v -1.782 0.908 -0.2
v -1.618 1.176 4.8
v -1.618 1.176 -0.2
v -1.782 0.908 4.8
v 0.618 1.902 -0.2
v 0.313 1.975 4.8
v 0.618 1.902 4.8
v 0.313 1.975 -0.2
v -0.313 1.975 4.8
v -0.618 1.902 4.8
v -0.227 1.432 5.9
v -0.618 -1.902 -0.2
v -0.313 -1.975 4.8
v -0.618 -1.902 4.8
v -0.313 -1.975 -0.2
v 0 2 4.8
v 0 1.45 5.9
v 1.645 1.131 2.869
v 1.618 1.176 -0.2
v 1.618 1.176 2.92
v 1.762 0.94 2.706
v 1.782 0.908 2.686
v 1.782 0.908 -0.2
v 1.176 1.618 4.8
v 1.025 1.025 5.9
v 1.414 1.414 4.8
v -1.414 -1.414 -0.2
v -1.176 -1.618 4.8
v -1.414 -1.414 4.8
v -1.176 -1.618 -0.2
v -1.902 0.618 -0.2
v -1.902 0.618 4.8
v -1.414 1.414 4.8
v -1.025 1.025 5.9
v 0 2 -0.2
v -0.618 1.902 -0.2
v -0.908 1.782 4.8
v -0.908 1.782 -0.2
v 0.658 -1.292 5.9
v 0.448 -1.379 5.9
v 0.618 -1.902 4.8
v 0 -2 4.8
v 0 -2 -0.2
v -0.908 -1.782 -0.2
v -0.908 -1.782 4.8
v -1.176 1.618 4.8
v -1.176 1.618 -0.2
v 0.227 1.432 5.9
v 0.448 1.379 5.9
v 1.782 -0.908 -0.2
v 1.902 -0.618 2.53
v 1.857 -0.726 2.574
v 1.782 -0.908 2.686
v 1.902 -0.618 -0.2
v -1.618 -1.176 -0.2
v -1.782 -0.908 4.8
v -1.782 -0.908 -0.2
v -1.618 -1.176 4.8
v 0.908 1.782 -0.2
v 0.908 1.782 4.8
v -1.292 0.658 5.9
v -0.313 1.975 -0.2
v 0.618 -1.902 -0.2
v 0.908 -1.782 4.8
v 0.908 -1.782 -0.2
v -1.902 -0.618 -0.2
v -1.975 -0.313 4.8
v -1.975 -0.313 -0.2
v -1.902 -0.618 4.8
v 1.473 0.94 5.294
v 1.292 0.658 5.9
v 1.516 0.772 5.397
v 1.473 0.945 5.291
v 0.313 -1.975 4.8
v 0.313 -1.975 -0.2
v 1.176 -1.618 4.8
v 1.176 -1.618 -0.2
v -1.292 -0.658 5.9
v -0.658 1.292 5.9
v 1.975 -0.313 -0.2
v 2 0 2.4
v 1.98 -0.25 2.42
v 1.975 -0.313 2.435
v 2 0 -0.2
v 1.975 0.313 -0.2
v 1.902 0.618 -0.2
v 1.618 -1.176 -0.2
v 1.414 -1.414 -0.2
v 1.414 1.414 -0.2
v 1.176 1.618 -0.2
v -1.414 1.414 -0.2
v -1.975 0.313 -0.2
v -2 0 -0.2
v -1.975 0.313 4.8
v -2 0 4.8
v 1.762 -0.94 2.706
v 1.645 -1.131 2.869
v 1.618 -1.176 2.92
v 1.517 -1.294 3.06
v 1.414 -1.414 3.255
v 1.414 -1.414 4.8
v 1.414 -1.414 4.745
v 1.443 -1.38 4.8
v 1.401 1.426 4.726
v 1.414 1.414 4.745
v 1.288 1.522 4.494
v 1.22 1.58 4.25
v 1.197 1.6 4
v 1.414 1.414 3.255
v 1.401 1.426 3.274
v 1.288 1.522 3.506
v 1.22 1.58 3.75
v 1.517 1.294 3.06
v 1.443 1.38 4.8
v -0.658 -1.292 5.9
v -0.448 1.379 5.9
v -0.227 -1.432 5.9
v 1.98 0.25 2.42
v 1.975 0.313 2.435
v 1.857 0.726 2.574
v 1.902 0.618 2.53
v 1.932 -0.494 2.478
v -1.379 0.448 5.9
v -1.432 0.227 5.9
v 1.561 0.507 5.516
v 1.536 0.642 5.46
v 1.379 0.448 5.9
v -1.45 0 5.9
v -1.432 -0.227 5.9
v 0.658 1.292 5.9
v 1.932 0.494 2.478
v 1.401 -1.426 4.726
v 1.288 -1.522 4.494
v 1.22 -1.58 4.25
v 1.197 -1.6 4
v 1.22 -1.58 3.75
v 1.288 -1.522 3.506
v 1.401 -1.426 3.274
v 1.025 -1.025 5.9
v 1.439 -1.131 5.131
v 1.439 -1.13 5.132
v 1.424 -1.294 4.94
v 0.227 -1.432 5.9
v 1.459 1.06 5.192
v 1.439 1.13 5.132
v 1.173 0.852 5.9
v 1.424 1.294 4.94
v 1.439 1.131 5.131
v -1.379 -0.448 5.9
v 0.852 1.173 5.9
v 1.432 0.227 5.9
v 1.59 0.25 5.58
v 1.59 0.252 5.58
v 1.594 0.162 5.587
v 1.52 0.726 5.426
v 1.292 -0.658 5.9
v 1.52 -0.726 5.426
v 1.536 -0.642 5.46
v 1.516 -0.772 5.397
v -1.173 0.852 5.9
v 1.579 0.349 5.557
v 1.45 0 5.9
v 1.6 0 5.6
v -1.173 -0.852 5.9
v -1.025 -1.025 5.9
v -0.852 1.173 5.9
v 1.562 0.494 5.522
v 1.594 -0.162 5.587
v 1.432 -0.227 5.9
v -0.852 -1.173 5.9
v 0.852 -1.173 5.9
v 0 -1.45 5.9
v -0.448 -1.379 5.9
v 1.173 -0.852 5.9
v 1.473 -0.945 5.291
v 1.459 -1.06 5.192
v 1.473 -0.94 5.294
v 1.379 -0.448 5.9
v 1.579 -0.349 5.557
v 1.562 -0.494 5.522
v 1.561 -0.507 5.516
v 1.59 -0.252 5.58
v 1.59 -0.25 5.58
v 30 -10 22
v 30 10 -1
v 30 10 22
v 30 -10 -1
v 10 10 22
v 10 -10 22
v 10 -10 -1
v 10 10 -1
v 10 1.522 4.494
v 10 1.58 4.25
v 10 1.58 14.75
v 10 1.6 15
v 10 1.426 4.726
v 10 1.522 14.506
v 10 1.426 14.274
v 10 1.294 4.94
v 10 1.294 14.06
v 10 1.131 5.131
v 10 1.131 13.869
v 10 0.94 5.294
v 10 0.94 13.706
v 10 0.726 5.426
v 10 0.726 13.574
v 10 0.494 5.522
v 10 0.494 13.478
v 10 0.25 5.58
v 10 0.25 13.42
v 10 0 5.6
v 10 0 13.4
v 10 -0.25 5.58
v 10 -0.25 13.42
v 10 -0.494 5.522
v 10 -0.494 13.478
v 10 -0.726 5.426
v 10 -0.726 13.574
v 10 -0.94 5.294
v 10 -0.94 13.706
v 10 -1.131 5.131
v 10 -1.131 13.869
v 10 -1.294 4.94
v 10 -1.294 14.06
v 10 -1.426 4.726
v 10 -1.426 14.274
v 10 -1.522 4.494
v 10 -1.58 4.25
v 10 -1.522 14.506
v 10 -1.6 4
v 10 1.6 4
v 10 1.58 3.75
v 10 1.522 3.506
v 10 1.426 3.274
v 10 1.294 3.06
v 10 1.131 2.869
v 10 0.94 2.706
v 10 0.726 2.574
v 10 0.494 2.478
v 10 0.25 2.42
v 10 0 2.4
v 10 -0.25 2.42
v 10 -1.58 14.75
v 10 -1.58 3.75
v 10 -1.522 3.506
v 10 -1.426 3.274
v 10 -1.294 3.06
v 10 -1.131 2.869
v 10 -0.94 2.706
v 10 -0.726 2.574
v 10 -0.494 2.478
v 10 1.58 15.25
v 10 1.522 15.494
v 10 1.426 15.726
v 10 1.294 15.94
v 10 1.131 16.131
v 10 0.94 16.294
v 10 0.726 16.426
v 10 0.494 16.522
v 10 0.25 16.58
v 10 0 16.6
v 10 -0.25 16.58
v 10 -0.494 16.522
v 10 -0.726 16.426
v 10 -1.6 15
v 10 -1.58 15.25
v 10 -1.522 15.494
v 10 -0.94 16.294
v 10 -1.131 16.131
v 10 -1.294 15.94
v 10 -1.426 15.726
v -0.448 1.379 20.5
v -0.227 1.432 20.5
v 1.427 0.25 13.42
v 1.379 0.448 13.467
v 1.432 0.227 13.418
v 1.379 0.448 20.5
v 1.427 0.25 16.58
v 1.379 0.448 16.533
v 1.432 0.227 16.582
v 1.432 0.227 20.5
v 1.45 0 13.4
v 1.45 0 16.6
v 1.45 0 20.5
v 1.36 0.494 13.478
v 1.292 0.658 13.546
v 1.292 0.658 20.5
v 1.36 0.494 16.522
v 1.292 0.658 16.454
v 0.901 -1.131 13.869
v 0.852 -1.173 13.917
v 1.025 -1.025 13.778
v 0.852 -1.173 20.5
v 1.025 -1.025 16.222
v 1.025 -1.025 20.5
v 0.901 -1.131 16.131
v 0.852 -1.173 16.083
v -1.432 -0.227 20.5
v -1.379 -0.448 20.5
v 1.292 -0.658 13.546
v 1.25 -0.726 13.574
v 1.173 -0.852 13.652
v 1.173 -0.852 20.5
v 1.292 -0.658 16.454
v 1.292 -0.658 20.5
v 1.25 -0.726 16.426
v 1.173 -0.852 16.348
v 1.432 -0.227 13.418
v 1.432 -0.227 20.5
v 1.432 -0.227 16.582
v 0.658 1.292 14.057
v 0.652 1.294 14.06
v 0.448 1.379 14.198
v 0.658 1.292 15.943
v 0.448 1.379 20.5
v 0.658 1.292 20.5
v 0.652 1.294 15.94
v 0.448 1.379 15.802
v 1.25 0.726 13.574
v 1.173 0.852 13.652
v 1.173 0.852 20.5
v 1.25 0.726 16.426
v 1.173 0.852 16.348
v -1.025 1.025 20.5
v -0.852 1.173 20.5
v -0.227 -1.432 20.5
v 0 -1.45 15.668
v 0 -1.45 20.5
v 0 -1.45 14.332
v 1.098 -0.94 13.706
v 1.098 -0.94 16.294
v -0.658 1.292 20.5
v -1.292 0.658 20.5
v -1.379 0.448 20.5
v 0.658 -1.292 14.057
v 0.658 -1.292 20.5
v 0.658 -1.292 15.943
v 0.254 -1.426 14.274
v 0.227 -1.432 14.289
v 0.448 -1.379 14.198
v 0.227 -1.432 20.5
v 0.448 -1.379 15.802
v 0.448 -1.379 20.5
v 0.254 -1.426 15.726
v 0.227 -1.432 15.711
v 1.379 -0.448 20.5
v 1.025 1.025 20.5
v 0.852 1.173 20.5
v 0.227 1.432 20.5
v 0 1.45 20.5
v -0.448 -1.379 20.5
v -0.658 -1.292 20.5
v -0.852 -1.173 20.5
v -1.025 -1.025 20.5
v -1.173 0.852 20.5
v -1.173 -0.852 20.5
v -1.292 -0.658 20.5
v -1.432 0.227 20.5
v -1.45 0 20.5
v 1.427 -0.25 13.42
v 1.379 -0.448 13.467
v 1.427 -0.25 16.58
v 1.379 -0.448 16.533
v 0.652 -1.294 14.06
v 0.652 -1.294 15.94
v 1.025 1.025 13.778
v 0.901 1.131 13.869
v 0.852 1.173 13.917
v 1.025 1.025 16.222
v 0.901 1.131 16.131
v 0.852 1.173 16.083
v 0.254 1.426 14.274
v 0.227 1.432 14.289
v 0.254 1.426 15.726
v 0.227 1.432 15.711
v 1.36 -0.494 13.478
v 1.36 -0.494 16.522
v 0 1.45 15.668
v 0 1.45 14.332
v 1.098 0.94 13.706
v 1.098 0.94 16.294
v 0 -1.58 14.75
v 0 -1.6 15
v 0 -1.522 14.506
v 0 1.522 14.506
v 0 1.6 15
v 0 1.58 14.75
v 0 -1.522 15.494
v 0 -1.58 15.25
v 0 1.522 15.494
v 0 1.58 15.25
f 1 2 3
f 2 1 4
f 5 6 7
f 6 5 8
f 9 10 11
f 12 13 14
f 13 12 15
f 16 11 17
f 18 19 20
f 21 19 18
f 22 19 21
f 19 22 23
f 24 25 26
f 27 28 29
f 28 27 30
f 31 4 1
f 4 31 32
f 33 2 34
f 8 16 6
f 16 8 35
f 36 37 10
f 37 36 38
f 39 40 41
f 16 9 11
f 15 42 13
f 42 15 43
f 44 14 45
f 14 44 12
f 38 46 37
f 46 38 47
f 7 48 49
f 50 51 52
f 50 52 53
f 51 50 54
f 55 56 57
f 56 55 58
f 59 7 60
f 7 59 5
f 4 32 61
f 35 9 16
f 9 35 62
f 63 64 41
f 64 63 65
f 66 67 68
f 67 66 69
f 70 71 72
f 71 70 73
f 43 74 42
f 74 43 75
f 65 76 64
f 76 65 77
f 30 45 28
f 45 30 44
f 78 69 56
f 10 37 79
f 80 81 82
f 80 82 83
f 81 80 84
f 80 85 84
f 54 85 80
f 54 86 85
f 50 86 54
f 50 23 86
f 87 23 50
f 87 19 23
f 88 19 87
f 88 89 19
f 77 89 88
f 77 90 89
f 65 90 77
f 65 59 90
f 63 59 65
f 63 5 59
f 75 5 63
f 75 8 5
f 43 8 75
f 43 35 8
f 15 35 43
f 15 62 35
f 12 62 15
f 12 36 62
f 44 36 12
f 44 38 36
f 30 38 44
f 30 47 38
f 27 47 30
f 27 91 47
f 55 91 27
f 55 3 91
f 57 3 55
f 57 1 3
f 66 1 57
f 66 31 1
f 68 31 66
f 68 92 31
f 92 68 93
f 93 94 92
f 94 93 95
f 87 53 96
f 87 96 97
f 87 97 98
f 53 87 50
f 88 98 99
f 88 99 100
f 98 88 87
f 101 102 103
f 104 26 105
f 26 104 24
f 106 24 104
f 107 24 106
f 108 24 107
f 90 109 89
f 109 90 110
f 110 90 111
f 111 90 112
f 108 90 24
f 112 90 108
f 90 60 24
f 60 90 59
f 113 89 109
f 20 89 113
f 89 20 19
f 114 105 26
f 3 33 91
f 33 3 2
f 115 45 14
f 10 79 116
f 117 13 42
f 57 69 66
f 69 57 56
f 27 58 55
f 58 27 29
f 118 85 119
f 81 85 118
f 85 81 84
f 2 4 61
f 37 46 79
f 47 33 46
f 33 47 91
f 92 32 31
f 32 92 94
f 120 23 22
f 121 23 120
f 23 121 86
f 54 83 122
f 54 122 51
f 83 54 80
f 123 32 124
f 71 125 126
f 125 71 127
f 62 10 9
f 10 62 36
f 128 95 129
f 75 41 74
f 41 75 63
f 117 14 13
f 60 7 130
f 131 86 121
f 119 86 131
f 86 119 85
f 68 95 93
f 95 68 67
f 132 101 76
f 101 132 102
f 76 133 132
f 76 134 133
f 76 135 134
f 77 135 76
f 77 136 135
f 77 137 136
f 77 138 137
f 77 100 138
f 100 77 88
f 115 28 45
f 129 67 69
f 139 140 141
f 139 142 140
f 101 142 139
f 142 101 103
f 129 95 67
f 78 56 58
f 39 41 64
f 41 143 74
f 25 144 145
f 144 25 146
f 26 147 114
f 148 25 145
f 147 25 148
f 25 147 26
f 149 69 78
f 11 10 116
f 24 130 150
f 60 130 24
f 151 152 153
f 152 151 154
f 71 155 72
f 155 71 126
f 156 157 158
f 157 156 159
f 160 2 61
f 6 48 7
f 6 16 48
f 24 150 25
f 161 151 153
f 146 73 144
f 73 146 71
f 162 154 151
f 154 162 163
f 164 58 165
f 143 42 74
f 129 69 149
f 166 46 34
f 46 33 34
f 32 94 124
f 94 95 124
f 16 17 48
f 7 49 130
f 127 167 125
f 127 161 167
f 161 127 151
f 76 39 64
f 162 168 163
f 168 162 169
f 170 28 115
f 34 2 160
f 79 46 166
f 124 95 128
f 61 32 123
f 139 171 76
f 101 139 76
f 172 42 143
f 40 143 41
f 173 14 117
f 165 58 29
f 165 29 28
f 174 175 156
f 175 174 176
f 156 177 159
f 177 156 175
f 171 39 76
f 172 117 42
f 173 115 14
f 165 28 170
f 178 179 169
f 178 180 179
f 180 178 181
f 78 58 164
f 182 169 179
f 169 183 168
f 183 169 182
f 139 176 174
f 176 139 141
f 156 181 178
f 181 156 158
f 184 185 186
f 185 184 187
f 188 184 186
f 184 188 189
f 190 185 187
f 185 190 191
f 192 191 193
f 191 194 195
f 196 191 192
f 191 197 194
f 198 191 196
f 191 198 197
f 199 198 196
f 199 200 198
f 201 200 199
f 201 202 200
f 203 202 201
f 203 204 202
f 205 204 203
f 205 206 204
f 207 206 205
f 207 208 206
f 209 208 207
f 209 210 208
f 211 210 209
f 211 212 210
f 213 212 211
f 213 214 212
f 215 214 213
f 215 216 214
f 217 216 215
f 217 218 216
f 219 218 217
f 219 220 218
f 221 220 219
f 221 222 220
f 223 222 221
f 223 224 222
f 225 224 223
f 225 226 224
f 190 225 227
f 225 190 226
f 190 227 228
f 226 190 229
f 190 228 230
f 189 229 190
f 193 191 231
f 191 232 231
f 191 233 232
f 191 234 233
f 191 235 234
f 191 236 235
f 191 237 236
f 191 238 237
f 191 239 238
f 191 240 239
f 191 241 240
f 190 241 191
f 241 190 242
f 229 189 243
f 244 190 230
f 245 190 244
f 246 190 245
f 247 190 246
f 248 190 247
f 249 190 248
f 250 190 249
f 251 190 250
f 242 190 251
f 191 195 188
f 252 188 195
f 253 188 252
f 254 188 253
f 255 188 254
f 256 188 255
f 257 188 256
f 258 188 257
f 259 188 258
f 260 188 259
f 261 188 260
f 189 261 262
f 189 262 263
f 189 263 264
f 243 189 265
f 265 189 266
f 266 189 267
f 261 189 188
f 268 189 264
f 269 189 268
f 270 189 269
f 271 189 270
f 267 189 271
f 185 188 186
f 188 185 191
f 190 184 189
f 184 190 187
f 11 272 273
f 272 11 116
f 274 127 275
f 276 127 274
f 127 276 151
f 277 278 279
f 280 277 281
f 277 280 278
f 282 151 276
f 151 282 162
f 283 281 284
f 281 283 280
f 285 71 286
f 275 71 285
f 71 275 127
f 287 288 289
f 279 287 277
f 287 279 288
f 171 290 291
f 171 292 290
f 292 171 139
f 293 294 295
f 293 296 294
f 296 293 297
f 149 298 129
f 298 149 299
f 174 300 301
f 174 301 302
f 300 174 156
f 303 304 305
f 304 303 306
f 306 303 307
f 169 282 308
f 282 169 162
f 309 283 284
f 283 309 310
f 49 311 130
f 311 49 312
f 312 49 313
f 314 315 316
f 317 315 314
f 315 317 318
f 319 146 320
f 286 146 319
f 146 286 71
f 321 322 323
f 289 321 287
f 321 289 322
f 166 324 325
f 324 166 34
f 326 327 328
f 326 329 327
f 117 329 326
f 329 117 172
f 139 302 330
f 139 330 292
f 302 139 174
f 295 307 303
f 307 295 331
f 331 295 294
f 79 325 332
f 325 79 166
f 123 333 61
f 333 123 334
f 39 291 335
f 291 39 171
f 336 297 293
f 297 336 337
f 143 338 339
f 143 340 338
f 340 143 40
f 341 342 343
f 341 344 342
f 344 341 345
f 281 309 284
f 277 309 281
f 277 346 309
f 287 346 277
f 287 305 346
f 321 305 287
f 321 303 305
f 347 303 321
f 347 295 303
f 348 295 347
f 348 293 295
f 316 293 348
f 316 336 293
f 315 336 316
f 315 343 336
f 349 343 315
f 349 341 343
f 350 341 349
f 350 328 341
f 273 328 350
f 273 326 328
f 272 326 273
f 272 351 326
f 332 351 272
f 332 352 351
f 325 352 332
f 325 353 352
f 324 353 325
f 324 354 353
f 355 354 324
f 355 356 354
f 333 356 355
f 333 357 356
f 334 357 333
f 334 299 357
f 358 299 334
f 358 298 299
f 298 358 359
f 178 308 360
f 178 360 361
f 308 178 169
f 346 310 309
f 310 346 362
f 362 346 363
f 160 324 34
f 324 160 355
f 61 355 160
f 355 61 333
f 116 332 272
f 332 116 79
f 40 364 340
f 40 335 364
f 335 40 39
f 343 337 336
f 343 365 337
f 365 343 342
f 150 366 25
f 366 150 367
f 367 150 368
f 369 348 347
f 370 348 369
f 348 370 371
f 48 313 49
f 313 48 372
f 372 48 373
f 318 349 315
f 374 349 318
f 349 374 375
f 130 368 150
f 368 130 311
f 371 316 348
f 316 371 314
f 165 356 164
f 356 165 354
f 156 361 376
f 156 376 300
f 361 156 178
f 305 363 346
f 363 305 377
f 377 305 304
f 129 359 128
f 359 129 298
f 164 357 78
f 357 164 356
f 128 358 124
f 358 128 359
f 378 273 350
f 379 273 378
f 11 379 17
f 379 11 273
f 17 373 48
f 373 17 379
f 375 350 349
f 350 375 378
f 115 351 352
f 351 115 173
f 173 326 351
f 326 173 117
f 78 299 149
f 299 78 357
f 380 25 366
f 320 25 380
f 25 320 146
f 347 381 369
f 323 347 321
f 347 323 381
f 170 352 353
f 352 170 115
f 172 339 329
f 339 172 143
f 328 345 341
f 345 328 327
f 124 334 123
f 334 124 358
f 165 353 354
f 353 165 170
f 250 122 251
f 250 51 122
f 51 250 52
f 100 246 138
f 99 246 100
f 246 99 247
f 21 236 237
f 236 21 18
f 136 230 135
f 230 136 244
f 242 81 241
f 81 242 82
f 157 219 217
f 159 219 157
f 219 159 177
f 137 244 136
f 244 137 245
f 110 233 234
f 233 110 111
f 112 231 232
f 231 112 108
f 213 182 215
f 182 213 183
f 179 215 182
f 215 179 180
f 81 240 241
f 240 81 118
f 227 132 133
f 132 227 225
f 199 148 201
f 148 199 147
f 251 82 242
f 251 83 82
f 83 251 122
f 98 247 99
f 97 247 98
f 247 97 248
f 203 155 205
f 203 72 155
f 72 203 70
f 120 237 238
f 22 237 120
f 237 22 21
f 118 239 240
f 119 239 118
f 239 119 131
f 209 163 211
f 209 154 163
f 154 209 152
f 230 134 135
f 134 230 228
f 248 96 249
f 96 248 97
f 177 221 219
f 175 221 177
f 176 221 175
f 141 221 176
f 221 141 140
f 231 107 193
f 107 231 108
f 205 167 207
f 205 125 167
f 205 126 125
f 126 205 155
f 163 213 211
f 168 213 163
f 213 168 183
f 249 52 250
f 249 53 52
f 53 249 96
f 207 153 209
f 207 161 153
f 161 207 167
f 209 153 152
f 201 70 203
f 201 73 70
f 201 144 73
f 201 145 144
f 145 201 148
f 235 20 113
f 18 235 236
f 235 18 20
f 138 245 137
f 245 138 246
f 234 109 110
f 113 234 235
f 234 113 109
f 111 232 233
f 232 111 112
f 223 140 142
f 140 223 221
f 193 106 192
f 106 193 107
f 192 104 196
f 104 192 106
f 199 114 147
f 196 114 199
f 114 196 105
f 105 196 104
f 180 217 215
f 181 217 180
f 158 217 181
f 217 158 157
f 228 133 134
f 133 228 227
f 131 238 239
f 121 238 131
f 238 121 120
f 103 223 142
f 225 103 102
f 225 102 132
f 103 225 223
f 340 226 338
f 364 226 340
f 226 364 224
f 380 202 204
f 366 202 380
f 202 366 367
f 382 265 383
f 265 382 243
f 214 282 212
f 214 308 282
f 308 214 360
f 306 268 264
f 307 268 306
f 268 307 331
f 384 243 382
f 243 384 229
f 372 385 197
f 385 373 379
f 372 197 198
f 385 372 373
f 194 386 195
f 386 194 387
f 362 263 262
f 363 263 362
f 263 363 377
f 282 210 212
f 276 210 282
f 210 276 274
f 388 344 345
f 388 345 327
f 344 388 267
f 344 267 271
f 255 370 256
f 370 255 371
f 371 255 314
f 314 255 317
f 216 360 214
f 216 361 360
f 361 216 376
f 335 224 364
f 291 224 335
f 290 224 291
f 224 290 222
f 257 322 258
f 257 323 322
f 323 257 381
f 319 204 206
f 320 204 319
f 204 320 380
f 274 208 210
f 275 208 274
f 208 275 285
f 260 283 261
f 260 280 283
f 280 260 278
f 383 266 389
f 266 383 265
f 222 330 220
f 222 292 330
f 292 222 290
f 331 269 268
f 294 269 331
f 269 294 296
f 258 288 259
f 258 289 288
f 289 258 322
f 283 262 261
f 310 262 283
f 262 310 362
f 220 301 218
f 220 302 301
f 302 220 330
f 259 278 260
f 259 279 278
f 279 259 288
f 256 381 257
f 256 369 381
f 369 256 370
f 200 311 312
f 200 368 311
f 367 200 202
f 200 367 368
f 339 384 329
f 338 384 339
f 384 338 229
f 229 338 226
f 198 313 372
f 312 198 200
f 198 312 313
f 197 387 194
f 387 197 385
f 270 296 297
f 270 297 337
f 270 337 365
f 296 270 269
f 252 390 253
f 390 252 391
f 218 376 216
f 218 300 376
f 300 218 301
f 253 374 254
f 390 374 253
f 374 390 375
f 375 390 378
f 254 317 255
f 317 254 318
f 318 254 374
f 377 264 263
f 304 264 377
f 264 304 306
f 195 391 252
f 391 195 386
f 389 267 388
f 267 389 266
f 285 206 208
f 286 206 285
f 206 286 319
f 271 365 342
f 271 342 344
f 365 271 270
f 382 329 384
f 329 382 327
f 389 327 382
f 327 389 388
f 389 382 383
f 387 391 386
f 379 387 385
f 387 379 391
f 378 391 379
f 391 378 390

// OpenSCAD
$fn = 40;


difference() {
	// slit(10,4,20);

	union() {
		translate([0,0,-0.2])
		hull() {
			translate([0,0,6])
			cylinder(h = 0.1, r=2.9/2);
			cylinder(h = 5, r=4/2);	
		}

		translate([10,-10,-1])
		cube(size=[20,20,23]);

		translate([0,0,0.5])
		cylinder(h = 20, r=2.9/2);


		translate([0,0,4])
		rotate(a=[0,90,0])
		cylinder(h=20,r=3.2/2);

		translate([0,0,15])
		rotate(a=[0,90,0])
		cylinder(h=20,r=3.2/2);
	}
}












module slit(length,radius,height) {
	hull() {
		translate([length,0,0]) cylinder(h = height, r=radius);
		translate([0,0,0]) cylinder(h = height, r=radius);
	}
}


	
